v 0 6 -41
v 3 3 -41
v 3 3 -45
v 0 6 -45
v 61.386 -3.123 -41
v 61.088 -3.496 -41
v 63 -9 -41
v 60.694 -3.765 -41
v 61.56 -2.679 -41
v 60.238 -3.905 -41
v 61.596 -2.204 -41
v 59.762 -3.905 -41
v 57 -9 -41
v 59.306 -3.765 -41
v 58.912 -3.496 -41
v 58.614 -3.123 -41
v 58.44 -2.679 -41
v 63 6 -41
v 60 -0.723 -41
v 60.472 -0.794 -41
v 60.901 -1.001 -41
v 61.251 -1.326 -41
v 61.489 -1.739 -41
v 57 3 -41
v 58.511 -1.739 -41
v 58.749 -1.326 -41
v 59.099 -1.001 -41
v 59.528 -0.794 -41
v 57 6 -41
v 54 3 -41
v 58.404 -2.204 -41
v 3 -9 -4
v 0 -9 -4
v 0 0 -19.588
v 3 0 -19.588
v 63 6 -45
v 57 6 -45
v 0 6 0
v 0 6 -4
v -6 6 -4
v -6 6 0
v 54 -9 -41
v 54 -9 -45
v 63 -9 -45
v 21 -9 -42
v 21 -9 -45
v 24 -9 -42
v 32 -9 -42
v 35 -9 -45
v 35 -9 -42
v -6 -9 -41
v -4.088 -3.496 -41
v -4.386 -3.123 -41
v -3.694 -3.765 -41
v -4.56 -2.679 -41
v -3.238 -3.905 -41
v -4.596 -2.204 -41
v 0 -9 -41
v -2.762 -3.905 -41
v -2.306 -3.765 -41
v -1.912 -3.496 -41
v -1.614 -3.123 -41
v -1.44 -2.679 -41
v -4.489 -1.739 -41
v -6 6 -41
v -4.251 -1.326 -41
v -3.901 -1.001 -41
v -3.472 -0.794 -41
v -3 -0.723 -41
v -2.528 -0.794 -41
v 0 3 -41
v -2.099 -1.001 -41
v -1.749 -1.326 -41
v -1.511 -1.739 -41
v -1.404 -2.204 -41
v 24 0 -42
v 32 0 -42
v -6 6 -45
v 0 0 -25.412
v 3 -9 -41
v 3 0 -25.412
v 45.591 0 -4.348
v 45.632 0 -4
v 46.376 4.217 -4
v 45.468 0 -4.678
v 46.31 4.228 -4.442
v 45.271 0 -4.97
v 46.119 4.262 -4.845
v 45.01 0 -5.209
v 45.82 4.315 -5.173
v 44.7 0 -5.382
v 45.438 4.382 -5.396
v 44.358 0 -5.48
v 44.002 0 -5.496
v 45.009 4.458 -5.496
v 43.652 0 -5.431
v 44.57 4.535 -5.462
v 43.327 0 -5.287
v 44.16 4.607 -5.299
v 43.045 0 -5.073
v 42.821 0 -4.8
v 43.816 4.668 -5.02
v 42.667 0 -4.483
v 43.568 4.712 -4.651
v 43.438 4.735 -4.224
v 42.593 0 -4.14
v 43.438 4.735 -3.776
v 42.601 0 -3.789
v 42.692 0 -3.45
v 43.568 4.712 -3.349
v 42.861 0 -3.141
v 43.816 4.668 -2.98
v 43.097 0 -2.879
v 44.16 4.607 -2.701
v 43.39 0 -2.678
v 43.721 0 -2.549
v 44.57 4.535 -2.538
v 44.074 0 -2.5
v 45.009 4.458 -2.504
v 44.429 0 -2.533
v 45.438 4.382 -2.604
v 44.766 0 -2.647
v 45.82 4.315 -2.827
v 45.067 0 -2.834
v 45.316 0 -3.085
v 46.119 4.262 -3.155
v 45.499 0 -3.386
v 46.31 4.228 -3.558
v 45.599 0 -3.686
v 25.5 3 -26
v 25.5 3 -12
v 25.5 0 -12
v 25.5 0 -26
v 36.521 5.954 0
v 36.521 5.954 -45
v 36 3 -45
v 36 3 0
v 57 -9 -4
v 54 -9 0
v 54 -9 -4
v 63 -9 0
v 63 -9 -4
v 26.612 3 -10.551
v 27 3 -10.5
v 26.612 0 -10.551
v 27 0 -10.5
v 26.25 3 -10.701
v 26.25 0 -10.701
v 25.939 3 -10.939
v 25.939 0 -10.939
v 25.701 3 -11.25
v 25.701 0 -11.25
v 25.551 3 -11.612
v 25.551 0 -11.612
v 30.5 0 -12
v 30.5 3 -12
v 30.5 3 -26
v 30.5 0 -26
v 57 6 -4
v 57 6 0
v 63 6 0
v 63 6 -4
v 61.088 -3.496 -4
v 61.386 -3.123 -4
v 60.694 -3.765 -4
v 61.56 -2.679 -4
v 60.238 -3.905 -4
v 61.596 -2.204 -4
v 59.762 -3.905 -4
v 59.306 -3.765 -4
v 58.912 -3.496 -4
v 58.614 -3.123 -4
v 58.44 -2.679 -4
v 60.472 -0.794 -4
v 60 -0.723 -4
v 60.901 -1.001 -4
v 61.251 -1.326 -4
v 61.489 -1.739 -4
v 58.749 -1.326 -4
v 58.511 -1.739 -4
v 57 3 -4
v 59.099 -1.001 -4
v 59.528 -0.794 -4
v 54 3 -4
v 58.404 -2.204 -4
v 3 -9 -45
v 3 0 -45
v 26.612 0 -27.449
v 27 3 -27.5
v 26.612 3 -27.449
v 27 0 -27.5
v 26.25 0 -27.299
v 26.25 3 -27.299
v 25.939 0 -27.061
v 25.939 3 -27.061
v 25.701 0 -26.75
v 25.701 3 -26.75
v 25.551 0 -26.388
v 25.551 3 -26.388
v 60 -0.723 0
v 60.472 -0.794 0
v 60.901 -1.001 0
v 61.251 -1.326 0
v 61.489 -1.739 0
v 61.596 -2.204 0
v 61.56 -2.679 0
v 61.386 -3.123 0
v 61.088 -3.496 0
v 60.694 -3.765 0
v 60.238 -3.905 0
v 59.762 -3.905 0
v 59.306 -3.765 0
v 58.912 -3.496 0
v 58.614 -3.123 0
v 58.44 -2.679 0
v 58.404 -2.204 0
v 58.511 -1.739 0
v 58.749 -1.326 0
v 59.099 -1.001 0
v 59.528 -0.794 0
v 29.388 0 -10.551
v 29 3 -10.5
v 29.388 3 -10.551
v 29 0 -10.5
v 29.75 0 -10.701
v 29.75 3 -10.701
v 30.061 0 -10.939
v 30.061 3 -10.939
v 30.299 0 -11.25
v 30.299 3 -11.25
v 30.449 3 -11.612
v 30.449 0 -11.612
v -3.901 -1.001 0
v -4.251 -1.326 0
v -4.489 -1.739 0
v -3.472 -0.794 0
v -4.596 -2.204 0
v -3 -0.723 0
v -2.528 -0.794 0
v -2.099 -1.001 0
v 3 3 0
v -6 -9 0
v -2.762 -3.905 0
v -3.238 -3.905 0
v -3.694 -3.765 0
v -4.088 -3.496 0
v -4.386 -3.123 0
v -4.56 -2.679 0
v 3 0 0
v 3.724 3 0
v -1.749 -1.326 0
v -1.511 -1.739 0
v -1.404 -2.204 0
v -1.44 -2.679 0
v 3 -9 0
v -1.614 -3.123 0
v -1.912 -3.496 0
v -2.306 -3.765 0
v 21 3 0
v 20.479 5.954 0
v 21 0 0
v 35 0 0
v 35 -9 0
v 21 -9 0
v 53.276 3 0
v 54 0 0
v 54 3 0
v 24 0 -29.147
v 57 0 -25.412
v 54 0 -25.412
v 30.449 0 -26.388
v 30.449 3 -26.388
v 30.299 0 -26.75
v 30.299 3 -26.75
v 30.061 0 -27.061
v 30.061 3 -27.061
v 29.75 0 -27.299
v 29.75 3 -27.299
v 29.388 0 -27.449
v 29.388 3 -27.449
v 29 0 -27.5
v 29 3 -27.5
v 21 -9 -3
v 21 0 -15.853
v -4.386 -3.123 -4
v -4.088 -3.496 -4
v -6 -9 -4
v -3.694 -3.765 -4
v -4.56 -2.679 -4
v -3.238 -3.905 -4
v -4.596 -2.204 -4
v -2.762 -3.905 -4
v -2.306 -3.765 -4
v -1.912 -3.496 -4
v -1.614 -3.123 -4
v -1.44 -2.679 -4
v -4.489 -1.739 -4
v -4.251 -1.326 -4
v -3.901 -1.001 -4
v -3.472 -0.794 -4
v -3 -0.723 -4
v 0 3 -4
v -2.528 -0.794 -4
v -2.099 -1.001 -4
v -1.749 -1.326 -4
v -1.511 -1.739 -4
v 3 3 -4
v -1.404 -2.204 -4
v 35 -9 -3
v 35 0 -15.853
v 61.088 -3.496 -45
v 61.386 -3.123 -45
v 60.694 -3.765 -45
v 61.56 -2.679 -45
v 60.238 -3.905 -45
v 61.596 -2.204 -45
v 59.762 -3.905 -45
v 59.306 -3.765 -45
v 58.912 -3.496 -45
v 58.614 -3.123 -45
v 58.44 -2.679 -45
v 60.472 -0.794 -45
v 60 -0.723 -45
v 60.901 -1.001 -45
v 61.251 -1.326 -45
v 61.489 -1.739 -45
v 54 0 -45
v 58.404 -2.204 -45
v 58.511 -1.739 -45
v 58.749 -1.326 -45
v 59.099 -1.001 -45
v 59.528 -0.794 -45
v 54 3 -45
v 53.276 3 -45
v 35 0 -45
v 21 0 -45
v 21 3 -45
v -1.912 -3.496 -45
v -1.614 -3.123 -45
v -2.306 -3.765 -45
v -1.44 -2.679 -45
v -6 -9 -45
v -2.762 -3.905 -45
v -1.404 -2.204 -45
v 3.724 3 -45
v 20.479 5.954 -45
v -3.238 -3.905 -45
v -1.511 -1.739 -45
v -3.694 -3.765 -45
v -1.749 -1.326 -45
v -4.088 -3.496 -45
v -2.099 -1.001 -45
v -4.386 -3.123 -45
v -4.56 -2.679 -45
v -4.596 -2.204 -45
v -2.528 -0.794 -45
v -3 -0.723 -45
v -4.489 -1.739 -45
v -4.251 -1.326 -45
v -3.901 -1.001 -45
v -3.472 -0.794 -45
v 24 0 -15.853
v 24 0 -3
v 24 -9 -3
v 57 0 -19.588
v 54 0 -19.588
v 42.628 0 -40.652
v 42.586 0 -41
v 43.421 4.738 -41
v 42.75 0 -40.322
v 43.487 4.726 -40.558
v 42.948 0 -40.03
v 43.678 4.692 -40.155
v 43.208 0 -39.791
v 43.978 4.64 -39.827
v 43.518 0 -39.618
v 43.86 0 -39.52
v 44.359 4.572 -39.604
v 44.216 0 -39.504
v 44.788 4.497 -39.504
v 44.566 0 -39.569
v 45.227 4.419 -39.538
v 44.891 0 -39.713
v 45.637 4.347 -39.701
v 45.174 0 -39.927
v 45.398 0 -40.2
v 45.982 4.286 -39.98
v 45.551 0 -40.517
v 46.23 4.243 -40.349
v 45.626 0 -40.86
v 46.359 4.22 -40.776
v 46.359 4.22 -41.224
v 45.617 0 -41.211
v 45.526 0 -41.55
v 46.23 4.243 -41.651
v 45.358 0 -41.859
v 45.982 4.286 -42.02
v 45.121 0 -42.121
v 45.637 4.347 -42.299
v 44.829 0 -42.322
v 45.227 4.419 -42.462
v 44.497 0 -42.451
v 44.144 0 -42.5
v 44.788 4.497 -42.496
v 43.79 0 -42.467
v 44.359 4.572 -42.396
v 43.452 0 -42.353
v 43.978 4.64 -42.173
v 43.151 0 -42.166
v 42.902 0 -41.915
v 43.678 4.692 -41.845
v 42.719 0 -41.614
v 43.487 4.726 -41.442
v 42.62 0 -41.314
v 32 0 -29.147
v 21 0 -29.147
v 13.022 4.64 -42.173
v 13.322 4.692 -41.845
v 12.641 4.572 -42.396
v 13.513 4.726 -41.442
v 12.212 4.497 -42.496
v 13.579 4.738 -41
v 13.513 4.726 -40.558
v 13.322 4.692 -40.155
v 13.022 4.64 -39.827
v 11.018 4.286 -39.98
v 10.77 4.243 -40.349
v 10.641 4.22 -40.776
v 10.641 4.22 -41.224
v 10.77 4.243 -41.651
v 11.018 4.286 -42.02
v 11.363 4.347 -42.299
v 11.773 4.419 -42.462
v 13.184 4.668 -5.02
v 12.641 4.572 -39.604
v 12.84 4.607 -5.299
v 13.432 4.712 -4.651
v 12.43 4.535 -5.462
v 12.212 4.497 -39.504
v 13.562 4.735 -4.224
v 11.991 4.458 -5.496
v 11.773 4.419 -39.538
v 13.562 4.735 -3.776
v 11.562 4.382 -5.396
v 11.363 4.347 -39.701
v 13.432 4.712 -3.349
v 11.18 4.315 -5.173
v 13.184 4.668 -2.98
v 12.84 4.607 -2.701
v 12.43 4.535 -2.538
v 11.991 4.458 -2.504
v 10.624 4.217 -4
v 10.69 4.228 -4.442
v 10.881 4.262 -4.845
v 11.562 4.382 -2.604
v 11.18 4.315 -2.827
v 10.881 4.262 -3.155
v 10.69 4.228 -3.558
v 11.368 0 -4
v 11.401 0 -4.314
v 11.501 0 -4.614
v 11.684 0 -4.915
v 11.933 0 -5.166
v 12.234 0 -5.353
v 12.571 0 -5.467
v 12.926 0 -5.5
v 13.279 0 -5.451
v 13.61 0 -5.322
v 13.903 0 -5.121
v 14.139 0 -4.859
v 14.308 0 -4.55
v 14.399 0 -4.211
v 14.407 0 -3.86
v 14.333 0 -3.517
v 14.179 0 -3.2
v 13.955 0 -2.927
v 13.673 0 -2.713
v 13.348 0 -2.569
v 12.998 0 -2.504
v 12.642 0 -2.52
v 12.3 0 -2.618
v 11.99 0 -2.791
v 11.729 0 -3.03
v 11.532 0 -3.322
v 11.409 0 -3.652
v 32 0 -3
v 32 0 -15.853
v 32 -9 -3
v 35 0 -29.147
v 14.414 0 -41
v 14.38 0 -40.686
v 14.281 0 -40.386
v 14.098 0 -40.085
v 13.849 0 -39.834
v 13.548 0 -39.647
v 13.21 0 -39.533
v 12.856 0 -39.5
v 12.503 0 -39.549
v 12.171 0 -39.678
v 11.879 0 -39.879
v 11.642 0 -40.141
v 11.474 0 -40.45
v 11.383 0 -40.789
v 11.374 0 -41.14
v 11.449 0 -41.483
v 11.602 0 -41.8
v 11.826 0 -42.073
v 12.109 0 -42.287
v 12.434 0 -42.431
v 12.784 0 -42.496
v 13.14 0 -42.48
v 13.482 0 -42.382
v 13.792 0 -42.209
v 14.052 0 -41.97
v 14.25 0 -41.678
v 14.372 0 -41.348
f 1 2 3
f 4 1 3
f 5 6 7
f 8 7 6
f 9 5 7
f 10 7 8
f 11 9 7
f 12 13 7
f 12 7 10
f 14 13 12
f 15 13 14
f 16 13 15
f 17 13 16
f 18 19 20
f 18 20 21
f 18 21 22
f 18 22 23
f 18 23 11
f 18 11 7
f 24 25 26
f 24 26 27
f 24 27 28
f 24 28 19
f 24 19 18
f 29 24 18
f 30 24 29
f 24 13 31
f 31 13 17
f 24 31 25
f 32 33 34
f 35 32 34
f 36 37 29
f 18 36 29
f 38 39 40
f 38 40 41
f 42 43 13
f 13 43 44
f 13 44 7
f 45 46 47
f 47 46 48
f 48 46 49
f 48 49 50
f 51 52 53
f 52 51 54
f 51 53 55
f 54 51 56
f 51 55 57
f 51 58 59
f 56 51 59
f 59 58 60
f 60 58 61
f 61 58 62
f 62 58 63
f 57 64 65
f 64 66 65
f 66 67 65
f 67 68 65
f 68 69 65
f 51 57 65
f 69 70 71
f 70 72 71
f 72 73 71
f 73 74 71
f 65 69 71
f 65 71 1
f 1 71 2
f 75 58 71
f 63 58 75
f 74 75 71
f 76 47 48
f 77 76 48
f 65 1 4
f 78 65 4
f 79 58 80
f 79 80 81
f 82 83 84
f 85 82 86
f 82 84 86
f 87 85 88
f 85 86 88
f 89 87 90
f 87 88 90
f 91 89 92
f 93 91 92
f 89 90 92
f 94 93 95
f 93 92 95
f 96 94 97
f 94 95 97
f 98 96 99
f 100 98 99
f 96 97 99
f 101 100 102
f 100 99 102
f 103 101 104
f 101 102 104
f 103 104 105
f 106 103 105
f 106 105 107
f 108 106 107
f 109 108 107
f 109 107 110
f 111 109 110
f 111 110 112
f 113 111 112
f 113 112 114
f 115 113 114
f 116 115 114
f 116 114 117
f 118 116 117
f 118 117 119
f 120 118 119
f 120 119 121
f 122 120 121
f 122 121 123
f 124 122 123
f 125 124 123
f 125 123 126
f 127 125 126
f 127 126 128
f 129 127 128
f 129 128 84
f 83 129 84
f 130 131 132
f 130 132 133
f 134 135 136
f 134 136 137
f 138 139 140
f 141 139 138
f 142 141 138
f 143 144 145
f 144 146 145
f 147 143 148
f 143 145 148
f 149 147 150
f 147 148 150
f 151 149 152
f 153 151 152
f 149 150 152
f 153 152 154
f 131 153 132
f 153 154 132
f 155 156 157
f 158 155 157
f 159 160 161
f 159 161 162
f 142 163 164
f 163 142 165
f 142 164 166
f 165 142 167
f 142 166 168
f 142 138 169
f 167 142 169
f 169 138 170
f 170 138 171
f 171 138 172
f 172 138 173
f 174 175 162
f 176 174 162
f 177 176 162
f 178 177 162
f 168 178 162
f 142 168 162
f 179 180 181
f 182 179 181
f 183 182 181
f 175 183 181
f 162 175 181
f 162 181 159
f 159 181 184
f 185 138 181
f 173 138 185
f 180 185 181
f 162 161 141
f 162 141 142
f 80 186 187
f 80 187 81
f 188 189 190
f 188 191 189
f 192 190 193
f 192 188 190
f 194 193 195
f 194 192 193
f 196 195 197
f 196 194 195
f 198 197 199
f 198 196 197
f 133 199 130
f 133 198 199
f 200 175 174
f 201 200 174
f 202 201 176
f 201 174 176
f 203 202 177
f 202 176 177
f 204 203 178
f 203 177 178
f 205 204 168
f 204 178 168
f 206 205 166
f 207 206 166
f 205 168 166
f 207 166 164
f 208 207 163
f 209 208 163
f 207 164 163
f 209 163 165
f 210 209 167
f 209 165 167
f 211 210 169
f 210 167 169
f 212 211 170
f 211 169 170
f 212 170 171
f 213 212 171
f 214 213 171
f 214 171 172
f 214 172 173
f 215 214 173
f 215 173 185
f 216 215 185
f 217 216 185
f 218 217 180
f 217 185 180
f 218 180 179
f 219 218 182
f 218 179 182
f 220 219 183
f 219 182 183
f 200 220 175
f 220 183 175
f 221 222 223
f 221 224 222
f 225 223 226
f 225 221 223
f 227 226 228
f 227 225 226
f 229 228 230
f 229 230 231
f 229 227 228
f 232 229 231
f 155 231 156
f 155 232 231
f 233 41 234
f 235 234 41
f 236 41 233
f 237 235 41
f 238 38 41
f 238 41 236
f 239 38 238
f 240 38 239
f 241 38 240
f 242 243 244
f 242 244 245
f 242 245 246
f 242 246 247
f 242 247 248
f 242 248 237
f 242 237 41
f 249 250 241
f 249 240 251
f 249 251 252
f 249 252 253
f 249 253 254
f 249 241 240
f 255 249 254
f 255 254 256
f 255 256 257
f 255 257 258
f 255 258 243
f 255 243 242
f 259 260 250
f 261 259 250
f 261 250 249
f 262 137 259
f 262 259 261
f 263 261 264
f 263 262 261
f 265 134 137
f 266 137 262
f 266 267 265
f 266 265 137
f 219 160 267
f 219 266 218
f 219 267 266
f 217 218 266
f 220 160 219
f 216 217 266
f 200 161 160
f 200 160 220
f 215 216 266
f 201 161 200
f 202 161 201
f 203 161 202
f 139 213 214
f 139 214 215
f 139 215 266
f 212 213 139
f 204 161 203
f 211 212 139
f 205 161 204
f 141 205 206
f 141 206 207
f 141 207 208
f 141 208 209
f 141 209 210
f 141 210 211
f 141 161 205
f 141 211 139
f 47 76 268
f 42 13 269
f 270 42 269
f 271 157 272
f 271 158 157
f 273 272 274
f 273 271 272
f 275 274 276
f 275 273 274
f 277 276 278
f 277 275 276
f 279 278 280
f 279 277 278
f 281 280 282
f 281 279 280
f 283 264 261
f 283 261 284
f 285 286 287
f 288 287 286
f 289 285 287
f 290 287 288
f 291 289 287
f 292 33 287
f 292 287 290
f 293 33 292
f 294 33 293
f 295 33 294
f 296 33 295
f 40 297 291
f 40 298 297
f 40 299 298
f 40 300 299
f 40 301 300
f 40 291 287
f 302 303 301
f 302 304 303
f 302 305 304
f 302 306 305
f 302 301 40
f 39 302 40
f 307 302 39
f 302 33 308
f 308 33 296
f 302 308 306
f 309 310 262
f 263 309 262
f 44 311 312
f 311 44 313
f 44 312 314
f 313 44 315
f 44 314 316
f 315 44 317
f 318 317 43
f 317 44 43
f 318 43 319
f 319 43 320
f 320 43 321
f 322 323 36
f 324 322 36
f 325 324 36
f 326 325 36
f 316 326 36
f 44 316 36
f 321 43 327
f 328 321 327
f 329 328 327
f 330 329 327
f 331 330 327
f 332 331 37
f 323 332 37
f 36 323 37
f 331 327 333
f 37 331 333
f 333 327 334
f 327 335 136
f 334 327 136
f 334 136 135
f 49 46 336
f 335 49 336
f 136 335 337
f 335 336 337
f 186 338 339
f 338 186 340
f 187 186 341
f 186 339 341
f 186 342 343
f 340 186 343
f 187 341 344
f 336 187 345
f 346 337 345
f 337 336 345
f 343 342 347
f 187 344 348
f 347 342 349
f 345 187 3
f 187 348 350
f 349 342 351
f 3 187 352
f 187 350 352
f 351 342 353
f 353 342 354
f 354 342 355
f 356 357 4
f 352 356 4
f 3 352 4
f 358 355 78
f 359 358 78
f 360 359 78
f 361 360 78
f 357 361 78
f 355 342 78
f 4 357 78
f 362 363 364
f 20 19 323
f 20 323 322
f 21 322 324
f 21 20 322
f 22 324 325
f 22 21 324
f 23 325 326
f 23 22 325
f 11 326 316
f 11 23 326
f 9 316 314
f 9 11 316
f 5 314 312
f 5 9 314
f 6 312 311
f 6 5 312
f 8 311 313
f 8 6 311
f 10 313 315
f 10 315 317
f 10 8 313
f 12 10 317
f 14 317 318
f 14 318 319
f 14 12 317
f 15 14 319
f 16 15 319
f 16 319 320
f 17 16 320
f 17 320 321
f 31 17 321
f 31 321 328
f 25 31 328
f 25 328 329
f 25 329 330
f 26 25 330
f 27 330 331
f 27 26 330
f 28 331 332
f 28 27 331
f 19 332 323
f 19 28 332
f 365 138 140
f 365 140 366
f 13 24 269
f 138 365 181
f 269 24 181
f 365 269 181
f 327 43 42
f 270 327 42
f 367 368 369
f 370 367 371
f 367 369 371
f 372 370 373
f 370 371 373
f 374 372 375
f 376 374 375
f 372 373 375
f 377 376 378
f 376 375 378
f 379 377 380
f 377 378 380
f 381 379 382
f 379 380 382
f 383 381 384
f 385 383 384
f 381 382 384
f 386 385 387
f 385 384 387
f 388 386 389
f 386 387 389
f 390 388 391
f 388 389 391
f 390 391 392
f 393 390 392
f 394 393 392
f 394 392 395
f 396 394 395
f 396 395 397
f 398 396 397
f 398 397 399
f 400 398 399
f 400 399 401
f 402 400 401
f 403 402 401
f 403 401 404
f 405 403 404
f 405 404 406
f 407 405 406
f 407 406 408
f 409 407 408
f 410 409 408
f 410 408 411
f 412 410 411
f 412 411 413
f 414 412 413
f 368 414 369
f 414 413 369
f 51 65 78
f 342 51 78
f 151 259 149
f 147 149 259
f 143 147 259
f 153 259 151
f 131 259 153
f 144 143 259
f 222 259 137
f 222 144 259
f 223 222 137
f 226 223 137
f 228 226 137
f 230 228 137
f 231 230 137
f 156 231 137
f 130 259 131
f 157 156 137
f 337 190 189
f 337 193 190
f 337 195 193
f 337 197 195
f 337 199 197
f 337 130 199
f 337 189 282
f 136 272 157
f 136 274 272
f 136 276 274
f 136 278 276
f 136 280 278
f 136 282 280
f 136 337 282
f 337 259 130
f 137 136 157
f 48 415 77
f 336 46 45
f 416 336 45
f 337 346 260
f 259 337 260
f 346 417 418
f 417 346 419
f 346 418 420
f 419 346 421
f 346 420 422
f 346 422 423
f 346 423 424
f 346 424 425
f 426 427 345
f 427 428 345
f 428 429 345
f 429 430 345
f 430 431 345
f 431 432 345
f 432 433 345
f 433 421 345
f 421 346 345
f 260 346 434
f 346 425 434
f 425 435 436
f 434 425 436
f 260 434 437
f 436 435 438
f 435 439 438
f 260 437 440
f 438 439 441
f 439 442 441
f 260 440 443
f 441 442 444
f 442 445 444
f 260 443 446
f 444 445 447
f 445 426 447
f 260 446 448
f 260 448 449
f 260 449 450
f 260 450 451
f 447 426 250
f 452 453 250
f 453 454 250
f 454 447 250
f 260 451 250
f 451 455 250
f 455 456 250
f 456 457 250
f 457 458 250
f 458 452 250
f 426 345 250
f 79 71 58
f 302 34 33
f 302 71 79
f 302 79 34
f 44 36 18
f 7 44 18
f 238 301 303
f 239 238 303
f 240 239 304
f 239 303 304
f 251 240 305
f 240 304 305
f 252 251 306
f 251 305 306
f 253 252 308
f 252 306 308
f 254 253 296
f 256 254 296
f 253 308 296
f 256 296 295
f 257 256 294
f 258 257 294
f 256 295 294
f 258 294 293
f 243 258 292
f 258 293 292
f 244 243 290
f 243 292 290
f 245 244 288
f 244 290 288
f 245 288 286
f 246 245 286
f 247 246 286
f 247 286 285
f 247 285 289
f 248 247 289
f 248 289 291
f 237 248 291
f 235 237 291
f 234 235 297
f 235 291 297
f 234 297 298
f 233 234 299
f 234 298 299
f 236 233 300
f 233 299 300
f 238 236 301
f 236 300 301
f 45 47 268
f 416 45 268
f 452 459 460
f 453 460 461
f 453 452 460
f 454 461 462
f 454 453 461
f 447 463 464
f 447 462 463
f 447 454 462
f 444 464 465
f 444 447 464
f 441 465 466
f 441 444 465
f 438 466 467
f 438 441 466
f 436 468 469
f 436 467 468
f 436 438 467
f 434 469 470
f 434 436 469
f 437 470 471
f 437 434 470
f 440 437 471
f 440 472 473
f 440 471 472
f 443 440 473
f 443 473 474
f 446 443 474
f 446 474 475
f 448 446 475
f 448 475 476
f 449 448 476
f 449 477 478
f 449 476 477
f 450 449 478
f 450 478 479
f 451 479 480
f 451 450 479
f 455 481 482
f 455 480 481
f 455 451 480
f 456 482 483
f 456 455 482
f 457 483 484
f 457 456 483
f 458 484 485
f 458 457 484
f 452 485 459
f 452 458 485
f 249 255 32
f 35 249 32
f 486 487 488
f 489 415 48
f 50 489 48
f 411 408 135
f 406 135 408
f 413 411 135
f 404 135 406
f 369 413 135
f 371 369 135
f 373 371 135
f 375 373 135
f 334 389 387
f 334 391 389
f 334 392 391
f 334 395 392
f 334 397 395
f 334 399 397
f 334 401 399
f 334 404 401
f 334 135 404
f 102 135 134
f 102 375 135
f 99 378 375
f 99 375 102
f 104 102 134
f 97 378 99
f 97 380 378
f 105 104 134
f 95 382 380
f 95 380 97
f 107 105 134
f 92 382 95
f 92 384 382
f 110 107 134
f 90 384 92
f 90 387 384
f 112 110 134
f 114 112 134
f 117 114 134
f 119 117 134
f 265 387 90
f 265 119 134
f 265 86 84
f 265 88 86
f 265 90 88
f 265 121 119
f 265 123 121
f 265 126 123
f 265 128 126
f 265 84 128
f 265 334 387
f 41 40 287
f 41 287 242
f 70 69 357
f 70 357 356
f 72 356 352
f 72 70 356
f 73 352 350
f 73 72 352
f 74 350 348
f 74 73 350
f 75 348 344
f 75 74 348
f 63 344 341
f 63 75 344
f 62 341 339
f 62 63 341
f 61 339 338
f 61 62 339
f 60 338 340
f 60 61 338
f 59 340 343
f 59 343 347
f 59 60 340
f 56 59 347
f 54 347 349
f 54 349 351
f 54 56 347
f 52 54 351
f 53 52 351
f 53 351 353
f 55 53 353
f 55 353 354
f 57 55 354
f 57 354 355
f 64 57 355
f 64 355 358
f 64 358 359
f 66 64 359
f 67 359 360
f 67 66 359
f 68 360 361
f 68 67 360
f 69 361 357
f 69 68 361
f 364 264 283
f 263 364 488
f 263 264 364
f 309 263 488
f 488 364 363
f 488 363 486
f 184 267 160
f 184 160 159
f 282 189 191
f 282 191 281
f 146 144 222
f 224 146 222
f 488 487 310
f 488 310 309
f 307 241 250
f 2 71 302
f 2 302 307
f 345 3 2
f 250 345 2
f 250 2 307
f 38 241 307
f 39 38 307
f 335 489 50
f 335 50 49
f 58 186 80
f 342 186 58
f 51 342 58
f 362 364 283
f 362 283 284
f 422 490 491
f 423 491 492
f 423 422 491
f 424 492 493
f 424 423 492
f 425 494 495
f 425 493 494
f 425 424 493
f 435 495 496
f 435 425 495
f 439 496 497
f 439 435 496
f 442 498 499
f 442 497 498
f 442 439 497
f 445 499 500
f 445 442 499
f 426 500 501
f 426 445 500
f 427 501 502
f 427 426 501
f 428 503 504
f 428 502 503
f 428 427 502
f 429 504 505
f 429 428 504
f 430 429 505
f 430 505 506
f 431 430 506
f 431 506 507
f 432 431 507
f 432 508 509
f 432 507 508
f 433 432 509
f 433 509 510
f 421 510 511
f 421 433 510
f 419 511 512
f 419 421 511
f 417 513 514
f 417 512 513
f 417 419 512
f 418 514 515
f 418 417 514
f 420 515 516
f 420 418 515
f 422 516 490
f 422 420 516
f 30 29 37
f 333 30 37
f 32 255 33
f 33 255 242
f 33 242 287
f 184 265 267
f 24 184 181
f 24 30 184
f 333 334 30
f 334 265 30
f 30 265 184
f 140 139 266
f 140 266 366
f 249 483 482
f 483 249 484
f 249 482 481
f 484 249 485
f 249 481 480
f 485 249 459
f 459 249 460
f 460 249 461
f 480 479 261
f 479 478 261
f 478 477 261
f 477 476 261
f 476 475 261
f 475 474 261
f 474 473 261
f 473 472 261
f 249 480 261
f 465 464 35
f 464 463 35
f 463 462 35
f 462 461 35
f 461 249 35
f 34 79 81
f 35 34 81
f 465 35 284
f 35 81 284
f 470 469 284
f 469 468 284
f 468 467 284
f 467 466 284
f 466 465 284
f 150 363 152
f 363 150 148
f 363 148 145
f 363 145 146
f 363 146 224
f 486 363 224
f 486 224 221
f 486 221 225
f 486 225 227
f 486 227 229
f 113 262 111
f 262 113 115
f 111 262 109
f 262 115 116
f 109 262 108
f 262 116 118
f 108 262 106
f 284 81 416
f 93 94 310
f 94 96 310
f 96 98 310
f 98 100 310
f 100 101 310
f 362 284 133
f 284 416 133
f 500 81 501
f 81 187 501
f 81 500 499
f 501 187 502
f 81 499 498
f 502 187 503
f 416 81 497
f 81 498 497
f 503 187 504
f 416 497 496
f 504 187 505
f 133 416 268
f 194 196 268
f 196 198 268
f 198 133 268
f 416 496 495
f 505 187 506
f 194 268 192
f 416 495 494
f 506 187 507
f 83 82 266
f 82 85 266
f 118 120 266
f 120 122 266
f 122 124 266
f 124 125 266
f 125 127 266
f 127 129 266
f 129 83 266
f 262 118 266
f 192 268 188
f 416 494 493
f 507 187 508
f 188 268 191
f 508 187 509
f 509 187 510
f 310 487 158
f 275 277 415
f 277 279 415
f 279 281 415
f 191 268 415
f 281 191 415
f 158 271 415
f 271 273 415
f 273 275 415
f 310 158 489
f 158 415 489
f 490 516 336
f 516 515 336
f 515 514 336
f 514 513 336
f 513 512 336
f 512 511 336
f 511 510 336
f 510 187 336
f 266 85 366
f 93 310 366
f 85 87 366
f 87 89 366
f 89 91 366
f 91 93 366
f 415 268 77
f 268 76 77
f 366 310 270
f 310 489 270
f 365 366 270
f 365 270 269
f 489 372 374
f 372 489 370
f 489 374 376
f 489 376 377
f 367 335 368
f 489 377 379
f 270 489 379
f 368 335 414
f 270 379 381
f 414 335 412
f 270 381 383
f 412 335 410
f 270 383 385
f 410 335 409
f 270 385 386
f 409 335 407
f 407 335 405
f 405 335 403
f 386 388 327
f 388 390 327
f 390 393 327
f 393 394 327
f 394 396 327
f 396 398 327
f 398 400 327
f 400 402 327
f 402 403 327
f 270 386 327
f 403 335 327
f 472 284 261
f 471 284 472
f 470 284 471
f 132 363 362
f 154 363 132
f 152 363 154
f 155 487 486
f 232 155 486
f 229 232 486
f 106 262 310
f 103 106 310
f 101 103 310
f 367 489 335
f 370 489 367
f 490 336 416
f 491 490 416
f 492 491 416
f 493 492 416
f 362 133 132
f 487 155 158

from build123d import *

# Parameters (mm, degrees)
SKETCH_1_W                 = 57
SKETCH_1_H                 = 45
EXTRUDE_1_DEPTH            = 3
SKETCH_2_W                 = 4
SKETCH_2_H                 = 15
EXTRUDE_2_DEPTH            = 6
SKETCH_3_W                 = 4
SKETCH_3_H                 = 15
EXTRUDE_3_DEPTH            = 6
EXTRUDE_4_DEPTH            = 3
SKETCH_5_W                 = 4
SKETCH_5_H                 = 9
EXTRUDE_5_DEPTH            = 3
CHAMFER_1_SIZE             = 3
SKETCH_6_R                 = 1.6
CUT_EXTRUDE_1_DEPTH        = 4
SKETCH_8_W                 = 8
SKETCH_8_H                 = 3
EXTRUDE_6_DEPTH            = 9
EXTRUDE_7_DEPTH            = 3
EXTRUDE_8_DEPTH            = 3
SKETCH_12_W                = 5
SKETCH_12_H                = 17
CUT_EXTRUDE_4_DEPTH        = 3
FILLET_1_R                 = 1.5
EXTRUDE_9_REACH            = 80.57
SKETCH_15_W                = 45
SKETCH_15_H                = 17.726539555
SKETCH_16_R                = 1.5
CUT_EXTRUDE_5_DEPTH        = 79.570276896
CHAMFER_1_OF_MIRROR_2_SIZE = 3


with BuildPart() as part:
    # 草图1 → 凸台-拉伸1 (new body)
    with BuildSketch(Plane(origin=(0, 0, 0), x_dir=(1, 0, 0), z_dir=(0, 1, 0))):
        with Locations((28.5, 22.5)):
            Rectangle(SKETCH_1_W, SKETCH_1_H)
    extrude(amount=EXTRUDE_1_DEPTH)

    # 草图2 → 凸台-拉伸2 (add)
    with BuildSketch(Plane.ZY):
        with Locations((-2, -1.5)):
            Rectangle(SKETCH_2_W, SKETCH_2_H)
    extrude_2 = extrude(amount=EXTRUDE_2_DEPTH)

    # 草图3 → 凸台-拉伸3 (add)
    with BuildSketch(Plane(origin=(57, 0, 0), x_dir=(0, 0, -1), z_dir=(1, 0, 0))):
        with Locations((2, -1.5)):
            Rectangle(SKETCH_3_W, SKETCH_3_H)
    extrude_3 = extrude(amount=EXTRUDE_3_DEPTH)

    # 草图4 → 凸台-拉伸4 (add)
    with BuildSketch(Plane.ZY.offset(-57)):
        Polygon((-4, -9), (-19.588457268, 0), (0, 0), (0, -9), align=None)
    extrude_4 = extrude(amount=EXTRUDE_4_DEPTH)

    # 草图5 → 凸台-拉伸5 (add)
    with BuildSketch(Plane(origin=(0, 0, 0), x_dir=(0, 0, -1), z_dir=(1, 0, 0))):
        Polygon((19.588457268, 0), (4, 0), (4, -9), align=None)
        with Locations((2, -4.5)):
            Rectangle(SKETCH_5_W, SKETCH_5_H)
    extrude_5 = extrude(amount=EXTRUDE_5_DEPTH)

    # 倒角1
    chamfer_1_edges = [part.edges().sort_by_distance(p)[0] for p in [
        (0, 3, -2),
        (57, 3, -2),
    ]]
    chamfer(chamfer_1_edges, length=CHAMFER_1_SIZE - 0.0001)  # a hair under: the kernel refuses the full size

    # 草图6 → 切除-拉伸1 (cut)
    with BuildSketch(Plane(origin=(0, 0, -4), x_dir=(-1, 0, 0), z_dir=(0, 0, -1))):
        with Locations(Location((3, -2.323268139, 0), (0, 0, 90))):
            Circle(SKETCH_6_R)
        with Locations(Location((-60, -2.323268139, 0), (0, 0, 90))):
            Circle(SKETCH_6_R)
    cut_extrude_1 = extrude(amount=-CUT_EXTRUDE_1_DEPTH, mode=Mode.SUBTRACT)

    # 草图8 → 凸台-拉伸6 (add)
    with BuildSketch(Plane.XZ):
        with Locations((28, -43.5)):
            Rectangle(SKETCH_8_W, SKETCH_8_H)
    extrude_6 = extrude(amount=EXTRUDE_6_DEPTH)

    # 草图9 → 凸台-拉伸7 (add)
    with BuildSketch(Plane(origin=(32, 0, 0), x_dir=(0, 0, -1), z_dir=(1, 0, 0))):
        Polygon((45, 0), (29.146667939, 0), (42, -9), (45, -9), align=None)
    extrude_7 = extrude(amount=EXTRUDE_7_DEPTH)

    # 草图10 → 凸台-拉伸8 (add)
    with BuildSketch(Plane.ZY.offset(-24)):
        Polygon((-45, 0), (-45, -9), (-42, -9), (-29.146667939, 0), align=None)
    extrude_8 = extrude(amount=EXTRUDE_8_DEPTH)

    # 草图12 → 切除-拉伸4 (cut)
    with BuildSketch(Plane(origin=(0, 3, 0), x_dir=(1, 0, 0), z_dir=(0, 1, 0))):
        with Locations((28, 19)):
            Rectangle(SKETCH_12_W, SKETCH_12_H)
    extrude(amount=-CUT_EXTRUDE_4_DEPTH, mode=Mode.SUBTRACT)

    # 圆角1
    fillet_1_edges = [part.edges().sort_by_distance(p)[0] for p in [
        (25.5, 1.5, -27.5),
        (30.5, 1.5, -27.5),
        (30.5, 1.5, -10.5),
        (25.5, 1.5, -10.5),
    ]]
    fillet(fillet_1_edges, radius=FILLET_1_R)

    # 草图15 → 凸台-拉伸9 (add, up to next)
    with BuildSketch(Plane(origin=(2.119507574, 12.02032477, 0), x_dir=(0, 0, 1), z_dir=(0.17364817766693066, 0.9848077530122081, 0)), mode=Mode.PRIVATE) as extrude_9_sk1:
        with Locations((-22.5, 43.795404353)):
            Rectangle(SKETCH_15_W, SKETCH_15_H)
    extrude_9_tool1 = extrude(extrude_9_sk1.sketch, amount=-EXTRUDE_9_REACH, mode=Mode.PRIVATE) - part.part
    extrude_9 = extrude_9_tool1.solids().sort_by_distance((45.249561, 4.415333, -22.5))[0]
    add(extrude_9)

    # 草图16 → 切除-拉伸5 (cut, through all)
    with BuildSketch(Plane(origin=(2.119507574, 12.02032477, 0), x_dir=(0.9848077530122081, -0.17364817766693064, 0), z_dir=(0.17364817766693064, 0.9848077530122081, 0))):
        with Locations(Location((43.439057305, 41, 0), (0, 0, 180))):
            Circle(SKETCH_16_R)
        with Locations((43.439057305, 4)):
            Circle(SKETCH_16_R)
    cut_extrude_5 = extrude(amount=-CUT_EXTRUDE_5_DEPTH, mode=Mode.SUBTRACT)

    # 镜向1: 凸台-拉伸9, 切除-拉伸5 across plane
    add(extrude_9.mirror(Plane(origin=(28.5, 0, 0), x_dir=(0, 0, 1), z_dir=(1, 0, 0))))
    add(cut_extrude_5.mirror(Plane(origin=(28.5, 0, 0), x_dir=(0, 0, 1), z_dir=(1, 0, 0))), mode=Mode.SUBTRACT)

    # 镜向2: 凸台-拉伸2, 凸台-拉伸3, 凸台-拉伸4, 凸台-拉伸5, 切除-拉伸1 across plane
    add(extrude_2.mirror(Plane.XY.offset(-22.5)))
    add(extrude_3.mirror(Plane.XY.offset(-22.5)))
    add(extrude_4.mirror(Plane.XY.offset(-22.5)))
    add(extrude_5.mirror(Plane.XY.offset(-22.5)))
    add(cut_extrude_1.mirror(Plane.XY.offset(-22.5)), mode=Mode.SUBTRACT)

    # 倒角1 of 镜向2
    chamfer_1_of_mirror_2_edges = [part.edges().sort_by_distance(p)[0] for p in [
        (0, 3, -43),
        (57, 3, -43),
    ]]
    chamfer(chamfer_1_of_mirror_2_edges, length=CHAMFER_1_OF_MIRROR_2_SIZE - 0.0001)  # a hair under: the kernel refuses the full size

    # 镜向3: 凸台-拉伸6, 凸台-拉伸7, 凸台-拉伸8 across plane
    add(extrude_6.mirror(Plane.XY.offset(-22.5)))
    add(extrude_7.mirror(Plane.XY.offset(-22.5)))
    add(extrude_8.mirror(Plane.XY.offset(-22.5)))


solid = part.part
